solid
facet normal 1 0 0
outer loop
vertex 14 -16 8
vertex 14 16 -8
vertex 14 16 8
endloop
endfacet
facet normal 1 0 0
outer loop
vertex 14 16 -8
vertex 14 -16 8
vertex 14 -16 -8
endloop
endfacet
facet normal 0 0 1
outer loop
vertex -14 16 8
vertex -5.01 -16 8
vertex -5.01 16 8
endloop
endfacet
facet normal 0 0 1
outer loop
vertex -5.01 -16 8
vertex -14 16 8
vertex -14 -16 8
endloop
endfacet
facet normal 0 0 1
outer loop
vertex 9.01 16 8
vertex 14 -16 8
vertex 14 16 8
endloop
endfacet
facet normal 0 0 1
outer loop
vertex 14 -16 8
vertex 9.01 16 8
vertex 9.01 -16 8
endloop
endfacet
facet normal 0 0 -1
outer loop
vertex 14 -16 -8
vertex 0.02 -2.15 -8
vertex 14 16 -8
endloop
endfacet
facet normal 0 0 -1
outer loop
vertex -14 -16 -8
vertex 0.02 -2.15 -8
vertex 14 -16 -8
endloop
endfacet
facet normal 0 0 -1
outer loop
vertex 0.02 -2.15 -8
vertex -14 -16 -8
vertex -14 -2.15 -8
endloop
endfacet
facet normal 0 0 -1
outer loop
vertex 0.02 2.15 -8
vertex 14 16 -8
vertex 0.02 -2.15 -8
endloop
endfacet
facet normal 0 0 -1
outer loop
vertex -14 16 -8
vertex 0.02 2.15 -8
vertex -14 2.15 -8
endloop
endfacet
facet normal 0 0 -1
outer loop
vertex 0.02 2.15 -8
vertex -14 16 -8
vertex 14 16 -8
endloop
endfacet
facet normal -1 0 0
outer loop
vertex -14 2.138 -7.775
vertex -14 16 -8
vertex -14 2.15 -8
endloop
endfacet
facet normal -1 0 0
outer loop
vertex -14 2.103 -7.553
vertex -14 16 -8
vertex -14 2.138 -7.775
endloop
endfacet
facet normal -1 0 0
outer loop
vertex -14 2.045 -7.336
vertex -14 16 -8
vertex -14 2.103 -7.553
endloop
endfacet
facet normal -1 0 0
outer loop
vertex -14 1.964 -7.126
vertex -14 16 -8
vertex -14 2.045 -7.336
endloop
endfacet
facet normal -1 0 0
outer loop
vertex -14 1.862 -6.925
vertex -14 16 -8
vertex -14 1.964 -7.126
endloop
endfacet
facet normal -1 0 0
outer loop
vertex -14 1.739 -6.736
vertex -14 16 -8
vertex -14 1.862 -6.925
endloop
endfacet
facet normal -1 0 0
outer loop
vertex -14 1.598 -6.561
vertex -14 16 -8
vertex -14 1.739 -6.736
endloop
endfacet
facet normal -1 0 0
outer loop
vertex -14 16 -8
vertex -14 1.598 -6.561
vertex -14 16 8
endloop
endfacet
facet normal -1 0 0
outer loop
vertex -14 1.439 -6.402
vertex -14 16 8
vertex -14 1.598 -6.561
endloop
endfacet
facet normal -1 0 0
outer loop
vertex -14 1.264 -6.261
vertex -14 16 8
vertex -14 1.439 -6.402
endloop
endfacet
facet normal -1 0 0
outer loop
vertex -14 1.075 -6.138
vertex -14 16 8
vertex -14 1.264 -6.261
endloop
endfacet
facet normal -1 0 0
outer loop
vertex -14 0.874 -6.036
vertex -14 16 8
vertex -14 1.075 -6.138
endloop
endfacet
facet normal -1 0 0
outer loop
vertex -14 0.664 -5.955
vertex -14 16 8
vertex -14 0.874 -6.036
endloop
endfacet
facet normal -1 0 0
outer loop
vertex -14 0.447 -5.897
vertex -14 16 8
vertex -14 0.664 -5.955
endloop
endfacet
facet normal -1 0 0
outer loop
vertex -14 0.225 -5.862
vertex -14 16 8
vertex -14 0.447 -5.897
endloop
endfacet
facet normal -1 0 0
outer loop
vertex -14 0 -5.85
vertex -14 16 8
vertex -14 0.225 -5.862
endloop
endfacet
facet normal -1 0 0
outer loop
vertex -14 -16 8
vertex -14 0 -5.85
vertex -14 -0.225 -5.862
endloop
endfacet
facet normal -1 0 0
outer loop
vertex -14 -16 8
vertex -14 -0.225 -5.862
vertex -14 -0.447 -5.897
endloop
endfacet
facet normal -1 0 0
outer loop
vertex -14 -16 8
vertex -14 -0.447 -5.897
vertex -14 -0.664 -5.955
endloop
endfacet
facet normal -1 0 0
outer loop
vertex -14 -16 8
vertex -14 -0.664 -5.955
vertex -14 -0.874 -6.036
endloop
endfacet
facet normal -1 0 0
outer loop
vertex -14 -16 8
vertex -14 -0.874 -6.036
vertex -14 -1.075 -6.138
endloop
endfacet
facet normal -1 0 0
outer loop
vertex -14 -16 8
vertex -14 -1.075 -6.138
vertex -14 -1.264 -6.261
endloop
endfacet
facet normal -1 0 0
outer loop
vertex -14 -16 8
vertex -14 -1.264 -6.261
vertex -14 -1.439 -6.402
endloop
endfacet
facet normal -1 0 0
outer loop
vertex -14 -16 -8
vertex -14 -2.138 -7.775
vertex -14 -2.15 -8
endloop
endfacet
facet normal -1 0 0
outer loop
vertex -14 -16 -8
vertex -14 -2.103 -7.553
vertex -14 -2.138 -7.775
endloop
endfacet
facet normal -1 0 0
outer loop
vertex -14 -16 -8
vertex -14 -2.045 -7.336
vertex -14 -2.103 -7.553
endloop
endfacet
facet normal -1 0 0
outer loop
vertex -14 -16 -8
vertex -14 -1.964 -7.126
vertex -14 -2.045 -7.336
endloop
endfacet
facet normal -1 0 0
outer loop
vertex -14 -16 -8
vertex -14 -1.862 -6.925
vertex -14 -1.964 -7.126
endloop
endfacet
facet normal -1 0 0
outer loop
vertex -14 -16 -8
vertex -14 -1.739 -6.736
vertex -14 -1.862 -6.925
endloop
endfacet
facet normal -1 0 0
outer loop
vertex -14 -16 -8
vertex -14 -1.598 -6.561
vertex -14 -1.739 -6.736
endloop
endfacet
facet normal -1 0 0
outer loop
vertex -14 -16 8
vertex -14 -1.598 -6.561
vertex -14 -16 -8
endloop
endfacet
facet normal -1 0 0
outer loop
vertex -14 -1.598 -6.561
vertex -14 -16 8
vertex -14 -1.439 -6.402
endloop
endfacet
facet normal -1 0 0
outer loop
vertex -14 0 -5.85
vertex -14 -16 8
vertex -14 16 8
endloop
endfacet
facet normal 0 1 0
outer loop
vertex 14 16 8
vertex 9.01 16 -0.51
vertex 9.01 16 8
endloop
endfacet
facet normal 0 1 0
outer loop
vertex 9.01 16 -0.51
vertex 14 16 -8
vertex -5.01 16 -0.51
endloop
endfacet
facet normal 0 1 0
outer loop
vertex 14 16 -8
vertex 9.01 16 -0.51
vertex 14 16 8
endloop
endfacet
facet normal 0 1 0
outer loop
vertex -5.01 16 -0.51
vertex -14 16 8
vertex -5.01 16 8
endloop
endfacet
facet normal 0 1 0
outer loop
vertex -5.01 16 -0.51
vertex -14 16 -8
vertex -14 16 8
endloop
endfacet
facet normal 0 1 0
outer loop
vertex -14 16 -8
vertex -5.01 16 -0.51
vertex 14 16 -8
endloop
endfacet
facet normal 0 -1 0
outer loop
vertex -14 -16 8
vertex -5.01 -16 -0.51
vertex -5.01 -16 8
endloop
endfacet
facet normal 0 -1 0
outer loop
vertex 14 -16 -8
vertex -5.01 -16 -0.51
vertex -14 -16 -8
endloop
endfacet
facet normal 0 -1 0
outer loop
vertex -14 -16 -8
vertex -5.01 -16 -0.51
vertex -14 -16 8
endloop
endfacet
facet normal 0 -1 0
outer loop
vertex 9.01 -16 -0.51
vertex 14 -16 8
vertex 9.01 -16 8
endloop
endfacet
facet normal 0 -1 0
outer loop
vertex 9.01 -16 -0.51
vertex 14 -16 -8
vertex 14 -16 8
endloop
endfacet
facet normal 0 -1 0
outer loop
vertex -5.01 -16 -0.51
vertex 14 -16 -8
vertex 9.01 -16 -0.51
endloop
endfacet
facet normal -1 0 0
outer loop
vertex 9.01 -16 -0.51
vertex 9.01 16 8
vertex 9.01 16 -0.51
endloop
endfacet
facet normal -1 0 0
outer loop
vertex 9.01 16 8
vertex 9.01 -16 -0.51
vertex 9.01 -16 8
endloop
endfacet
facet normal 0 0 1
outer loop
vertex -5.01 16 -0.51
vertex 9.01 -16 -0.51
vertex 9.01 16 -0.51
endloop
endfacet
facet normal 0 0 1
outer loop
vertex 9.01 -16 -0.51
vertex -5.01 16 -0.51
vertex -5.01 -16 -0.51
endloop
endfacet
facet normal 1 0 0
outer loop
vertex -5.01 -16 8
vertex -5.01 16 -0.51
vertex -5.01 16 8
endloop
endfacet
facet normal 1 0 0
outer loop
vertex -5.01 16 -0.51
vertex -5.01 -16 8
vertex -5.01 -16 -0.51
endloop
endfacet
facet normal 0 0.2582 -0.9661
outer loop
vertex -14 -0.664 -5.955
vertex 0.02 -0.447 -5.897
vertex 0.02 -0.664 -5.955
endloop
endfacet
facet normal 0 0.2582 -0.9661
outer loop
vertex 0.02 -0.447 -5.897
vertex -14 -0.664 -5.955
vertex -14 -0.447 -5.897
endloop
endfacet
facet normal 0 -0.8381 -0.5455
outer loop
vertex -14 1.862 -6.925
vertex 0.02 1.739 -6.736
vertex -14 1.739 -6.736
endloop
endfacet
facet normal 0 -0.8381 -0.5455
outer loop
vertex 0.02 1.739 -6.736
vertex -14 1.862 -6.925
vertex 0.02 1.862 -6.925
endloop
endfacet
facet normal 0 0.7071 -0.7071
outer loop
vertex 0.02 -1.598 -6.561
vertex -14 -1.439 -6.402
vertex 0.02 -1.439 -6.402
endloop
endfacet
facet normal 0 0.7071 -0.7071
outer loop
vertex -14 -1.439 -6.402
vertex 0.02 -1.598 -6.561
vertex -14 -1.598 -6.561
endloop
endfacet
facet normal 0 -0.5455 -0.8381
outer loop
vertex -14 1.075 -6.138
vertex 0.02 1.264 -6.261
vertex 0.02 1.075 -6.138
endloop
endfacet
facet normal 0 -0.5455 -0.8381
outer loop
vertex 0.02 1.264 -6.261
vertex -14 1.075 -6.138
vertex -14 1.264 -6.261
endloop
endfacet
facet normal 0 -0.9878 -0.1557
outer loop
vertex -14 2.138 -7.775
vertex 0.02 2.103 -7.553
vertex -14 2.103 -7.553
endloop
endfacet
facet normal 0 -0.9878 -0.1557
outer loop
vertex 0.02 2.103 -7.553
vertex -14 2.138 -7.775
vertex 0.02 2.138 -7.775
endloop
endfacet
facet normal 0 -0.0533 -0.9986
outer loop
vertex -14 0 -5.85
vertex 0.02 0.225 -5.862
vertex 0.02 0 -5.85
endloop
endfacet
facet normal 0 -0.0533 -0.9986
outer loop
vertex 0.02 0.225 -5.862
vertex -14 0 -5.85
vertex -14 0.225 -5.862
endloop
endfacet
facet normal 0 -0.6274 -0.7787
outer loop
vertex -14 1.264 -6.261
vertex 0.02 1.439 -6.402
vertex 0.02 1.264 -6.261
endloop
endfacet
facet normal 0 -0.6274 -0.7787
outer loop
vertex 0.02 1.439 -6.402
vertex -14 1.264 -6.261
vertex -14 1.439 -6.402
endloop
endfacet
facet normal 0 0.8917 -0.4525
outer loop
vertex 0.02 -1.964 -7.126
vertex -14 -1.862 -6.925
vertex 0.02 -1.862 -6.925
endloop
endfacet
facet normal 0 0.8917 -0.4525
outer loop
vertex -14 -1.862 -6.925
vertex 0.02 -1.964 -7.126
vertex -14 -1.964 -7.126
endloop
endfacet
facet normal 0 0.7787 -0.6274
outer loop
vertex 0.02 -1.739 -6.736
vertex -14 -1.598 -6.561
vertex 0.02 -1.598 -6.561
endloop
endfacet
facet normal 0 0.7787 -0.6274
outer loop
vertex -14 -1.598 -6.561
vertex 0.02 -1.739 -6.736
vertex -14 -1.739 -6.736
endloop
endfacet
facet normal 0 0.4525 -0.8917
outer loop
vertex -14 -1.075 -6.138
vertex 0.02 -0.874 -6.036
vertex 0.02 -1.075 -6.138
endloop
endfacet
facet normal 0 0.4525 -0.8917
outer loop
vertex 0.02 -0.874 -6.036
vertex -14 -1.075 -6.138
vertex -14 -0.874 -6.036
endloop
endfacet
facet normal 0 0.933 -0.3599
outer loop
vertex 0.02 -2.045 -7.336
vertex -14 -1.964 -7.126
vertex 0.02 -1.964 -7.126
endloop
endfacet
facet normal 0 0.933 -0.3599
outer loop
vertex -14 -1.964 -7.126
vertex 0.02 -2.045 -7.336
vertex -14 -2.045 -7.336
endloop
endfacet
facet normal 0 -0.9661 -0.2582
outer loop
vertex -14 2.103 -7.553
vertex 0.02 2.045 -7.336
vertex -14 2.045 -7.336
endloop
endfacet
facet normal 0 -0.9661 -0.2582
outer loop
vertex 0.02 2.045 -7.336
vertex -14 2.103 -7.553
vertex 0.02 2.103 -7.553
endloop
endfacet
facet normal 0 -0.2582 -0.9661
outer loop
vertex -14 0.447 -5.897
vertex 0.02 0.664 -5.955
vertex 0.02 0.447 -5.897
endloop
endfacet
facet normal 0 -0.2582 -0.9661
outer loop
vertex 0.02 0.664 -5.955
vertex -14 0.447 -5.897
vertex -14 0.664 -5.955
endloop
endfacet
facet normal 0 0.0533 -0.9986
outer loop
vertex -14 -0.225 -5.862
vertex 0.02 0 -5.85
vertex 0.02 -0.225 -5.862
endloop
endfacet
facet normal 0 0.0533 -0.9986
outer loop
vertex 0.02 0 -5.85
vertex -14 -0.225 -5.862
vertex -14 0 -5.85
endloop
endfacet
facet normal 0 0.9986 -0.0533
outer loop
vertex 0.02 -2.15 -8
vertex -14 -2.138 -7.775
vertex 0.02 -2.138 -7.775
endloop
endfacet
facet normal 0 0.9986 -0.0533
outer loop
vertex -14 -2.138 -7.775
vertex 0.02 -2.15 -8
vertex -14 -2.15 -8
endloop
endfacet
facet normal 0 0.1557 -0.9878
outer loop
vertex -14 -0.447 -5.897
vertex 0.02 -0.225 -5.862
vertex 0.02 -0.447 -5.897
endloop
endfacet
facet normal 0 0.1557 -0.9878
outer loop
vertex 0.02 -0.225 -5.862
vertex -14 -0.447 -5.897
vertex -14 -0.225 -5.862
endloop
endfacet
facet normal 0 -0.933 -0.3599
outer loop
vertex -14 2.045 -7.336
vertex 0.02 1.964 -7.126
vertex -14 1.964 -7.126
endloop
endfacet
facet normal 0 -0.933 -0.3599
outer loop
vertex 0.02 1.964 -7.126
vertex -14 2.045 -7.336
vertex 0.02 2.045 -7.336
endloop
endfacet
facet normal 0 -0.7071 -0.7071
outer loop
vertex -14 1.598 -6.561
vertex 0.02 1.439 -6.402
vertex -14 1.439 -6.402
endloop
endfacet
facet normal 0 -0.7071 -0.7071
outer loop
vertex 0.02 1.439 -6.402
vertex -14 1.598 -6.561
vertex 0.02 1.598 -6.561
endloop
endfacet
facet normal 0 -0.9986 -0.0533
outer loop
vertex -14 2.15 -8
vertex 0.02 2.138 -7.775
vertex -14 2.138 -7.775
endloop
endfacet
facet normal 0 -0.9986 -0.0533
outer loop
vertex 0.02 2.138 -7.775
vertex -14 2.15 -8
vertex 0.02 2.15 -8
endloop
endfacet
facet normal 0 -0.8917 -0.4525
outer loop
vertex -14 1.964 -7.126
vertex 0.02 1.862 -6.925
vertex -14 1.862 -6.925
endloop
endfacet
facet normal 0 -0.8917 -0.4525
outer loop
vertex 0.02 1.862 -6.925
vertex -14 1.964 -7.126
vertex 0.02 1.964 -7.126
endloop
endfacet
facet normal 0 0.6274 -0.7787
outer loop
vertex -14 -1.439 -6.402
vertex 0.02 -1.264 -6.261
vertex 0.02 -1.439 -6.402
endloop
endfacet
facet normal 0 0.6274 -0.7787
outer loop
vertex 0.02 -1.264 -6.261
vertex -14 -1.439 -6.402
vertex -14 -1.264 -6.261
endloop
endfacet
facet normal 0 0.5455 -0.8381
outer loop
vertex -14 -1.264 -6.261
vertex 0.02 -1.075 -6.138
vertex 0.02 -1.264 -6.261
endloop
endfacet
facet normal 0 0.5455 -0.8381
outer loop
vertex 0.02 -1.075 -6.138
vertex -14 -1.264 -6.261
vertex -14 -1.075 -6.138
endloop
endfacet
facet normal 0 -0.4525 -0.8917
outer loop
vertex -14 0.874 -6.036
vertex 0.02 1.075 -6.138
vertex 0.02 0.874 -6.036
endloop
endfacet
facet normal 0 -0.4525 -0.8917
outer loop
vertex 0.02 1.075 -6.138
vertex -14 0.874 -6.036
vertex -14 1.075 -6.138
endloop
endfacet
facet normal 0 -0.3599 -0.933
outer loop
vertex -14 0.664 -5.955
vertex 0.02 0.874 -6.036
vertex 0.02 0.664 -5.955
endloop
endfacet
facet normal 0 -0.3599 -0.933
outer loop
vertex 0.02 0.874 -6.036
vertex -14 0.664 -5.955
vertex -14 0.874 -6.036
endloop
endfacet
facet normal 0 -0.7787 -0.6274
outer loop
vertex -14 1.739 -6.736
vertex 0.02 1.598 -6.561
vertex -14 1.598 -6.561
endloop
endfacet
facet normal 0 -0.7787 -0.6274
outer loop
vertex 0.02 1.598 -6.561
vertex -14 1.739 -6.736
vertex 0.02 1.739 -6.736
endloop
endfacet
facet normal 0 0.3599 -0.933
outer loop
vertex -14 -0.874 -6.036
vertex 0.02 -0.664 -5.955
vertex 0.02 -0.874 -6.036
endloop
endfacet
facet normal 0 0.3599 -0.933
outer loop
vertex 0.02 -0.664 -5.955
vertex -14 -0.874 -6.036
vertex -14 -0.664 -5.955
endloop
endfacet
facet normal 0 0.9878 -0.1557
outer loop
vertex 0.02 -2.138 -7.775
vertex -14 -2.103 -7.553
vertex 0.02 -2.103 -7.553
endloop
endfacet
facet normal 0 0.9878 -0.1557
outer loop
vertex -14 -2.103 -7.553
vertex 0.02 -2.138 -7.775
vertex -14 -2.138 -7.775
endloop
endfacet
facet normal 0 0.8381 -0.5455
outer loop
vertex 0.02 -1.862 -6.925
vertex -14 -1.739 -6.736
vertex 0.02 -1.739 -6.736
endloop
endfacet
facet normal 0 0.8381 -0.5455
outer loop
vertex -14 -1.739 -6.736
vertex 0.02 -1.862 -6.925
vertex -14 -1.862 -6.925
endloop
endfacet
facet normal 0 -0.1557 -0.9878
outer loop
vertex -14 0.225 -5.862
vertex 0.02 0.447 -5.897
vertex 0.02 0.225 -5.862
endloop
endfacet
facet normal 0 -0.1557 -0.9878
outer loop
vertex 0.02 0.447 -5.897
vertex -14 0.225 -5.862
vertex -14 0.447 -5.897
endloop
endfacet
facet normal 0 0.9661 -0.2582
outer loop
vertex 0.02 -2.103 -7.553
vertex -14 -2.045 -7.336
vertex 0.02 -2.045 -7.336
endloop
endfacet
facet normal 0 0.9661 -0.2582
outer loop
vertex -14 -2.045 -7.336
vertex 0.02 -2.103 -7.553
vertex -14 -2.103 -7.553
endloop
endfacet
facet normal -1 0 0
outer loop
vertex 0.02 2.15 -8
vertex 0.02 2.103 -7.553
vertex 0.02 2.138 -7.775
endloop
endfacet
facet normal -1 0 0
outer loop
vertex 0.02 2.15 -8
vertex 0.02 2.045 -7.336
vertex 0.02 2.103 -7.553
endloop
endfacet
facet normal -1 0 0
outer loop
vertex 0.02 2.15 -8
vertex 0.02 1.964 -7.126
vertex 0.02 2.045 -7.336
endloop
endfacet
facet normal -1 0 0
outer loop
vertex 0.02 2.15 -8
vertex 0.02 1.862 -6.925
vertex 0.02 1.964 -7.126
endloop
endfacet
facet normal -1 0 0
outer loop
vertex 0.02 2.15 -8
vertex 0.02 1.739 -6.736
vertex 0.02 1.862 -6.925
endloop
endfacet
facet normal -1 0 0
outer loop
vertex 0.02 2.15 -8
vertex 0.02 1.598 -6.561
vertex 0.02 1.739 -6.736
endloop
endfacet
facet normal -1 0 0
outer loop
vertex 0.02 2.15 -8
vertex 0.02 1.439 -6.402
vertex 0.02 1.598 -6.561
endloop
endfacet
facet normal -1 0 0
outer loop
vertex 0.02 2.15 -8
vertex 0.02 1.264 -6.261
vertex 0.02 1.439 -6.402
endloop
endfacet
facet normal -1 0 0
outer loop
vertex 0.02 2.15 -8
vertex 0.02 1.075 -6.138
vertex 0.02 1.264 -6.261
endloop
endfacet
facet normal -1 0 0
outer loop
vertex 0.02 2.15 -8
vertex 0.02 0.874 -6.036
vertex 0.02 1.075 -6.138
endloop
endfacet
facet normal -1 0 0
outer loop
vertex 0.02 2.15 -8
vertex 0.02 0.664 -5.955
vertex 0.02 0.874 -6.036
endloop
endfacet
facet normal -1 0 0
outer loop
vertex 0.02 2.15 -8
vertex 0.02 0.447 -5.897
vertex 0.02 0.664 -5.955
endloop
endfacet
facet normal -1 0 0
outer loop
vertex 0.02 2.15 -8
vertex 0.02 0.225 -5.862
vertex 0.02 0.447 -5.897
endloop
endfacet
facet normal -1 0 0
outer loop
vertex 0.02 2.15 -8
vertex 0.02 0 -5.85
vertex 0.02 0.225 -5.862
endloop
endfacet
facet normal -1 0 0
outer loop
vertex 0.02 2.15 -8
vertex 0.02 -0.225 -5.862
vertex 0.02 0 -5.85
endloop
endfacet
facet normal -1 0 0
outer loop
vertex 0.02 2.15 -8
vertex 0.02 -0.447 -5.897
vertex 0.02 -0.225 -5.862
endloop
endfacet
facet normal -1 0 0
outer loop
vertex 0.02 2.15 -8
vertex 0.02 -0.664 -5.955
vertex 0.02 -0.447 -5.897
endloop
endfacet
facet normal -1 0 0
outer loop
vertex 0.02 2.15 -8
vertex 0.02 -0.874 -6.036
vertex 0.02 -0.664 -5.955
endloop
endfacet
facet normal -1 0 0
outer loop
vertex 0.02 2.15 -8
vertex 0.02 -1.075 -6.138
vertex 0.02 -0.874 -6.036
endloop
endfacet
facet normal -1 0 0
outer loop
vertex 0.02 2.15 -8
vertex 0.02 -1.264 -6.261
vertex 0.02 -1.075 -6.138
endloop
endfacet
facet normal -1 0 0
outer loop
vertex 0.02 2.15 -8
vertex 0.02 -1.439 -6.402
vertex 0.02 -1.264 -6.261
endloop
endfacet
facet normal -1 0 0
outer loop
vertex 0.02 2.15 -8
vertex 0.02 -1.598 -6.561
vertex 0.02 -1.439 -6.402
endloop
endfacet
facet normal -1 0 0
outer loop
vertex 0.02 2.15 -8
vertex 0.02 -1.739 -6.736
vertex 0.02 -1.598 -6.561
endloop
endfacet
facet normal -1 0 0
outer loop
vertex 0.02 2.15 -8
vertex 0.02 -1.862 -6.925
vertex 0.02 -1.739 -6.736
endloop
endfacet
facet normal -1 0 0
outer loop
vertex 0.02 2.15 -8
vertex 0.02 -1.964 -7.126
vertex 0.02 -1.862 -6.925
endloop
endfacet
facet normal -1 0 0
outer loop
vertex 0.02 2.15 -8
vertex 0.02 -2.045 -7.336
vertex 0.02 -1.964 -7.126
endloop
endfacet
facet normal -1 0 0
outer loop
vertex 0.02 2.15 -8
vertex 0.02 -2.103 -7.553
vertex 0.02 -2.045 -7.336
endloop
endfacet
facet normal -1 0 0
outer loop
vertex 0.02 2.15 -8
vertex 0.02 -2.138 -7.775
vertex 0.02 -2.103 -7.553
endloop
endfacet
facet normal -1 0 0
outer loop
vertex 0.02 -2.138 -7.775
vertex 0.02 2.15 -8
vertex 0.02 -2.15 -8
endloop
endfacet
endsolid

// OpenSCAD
// Snap panel clip with a U-shaped panel slot.
$fn = 60;
eps = 0.02;
panel_t = 8;
clip_w = 32;
clip_l = 28;
clip_h = panel_t + 8;
slot = panel_t + 0.5;
difference() {
    cube([clip_l,clip_w,clip_h],center=true);
    translate([2,0,clip_h/2-slot/2]) cube([clip_l/2+eps,clip_w+2*eps,slot+eps],center=true);
    translate([-clip_l/2-eps,0,-clip_h/2]) rotate([0,90,0]) cylinder(d=4.3,h=clip_l/2+2*eps);
}
